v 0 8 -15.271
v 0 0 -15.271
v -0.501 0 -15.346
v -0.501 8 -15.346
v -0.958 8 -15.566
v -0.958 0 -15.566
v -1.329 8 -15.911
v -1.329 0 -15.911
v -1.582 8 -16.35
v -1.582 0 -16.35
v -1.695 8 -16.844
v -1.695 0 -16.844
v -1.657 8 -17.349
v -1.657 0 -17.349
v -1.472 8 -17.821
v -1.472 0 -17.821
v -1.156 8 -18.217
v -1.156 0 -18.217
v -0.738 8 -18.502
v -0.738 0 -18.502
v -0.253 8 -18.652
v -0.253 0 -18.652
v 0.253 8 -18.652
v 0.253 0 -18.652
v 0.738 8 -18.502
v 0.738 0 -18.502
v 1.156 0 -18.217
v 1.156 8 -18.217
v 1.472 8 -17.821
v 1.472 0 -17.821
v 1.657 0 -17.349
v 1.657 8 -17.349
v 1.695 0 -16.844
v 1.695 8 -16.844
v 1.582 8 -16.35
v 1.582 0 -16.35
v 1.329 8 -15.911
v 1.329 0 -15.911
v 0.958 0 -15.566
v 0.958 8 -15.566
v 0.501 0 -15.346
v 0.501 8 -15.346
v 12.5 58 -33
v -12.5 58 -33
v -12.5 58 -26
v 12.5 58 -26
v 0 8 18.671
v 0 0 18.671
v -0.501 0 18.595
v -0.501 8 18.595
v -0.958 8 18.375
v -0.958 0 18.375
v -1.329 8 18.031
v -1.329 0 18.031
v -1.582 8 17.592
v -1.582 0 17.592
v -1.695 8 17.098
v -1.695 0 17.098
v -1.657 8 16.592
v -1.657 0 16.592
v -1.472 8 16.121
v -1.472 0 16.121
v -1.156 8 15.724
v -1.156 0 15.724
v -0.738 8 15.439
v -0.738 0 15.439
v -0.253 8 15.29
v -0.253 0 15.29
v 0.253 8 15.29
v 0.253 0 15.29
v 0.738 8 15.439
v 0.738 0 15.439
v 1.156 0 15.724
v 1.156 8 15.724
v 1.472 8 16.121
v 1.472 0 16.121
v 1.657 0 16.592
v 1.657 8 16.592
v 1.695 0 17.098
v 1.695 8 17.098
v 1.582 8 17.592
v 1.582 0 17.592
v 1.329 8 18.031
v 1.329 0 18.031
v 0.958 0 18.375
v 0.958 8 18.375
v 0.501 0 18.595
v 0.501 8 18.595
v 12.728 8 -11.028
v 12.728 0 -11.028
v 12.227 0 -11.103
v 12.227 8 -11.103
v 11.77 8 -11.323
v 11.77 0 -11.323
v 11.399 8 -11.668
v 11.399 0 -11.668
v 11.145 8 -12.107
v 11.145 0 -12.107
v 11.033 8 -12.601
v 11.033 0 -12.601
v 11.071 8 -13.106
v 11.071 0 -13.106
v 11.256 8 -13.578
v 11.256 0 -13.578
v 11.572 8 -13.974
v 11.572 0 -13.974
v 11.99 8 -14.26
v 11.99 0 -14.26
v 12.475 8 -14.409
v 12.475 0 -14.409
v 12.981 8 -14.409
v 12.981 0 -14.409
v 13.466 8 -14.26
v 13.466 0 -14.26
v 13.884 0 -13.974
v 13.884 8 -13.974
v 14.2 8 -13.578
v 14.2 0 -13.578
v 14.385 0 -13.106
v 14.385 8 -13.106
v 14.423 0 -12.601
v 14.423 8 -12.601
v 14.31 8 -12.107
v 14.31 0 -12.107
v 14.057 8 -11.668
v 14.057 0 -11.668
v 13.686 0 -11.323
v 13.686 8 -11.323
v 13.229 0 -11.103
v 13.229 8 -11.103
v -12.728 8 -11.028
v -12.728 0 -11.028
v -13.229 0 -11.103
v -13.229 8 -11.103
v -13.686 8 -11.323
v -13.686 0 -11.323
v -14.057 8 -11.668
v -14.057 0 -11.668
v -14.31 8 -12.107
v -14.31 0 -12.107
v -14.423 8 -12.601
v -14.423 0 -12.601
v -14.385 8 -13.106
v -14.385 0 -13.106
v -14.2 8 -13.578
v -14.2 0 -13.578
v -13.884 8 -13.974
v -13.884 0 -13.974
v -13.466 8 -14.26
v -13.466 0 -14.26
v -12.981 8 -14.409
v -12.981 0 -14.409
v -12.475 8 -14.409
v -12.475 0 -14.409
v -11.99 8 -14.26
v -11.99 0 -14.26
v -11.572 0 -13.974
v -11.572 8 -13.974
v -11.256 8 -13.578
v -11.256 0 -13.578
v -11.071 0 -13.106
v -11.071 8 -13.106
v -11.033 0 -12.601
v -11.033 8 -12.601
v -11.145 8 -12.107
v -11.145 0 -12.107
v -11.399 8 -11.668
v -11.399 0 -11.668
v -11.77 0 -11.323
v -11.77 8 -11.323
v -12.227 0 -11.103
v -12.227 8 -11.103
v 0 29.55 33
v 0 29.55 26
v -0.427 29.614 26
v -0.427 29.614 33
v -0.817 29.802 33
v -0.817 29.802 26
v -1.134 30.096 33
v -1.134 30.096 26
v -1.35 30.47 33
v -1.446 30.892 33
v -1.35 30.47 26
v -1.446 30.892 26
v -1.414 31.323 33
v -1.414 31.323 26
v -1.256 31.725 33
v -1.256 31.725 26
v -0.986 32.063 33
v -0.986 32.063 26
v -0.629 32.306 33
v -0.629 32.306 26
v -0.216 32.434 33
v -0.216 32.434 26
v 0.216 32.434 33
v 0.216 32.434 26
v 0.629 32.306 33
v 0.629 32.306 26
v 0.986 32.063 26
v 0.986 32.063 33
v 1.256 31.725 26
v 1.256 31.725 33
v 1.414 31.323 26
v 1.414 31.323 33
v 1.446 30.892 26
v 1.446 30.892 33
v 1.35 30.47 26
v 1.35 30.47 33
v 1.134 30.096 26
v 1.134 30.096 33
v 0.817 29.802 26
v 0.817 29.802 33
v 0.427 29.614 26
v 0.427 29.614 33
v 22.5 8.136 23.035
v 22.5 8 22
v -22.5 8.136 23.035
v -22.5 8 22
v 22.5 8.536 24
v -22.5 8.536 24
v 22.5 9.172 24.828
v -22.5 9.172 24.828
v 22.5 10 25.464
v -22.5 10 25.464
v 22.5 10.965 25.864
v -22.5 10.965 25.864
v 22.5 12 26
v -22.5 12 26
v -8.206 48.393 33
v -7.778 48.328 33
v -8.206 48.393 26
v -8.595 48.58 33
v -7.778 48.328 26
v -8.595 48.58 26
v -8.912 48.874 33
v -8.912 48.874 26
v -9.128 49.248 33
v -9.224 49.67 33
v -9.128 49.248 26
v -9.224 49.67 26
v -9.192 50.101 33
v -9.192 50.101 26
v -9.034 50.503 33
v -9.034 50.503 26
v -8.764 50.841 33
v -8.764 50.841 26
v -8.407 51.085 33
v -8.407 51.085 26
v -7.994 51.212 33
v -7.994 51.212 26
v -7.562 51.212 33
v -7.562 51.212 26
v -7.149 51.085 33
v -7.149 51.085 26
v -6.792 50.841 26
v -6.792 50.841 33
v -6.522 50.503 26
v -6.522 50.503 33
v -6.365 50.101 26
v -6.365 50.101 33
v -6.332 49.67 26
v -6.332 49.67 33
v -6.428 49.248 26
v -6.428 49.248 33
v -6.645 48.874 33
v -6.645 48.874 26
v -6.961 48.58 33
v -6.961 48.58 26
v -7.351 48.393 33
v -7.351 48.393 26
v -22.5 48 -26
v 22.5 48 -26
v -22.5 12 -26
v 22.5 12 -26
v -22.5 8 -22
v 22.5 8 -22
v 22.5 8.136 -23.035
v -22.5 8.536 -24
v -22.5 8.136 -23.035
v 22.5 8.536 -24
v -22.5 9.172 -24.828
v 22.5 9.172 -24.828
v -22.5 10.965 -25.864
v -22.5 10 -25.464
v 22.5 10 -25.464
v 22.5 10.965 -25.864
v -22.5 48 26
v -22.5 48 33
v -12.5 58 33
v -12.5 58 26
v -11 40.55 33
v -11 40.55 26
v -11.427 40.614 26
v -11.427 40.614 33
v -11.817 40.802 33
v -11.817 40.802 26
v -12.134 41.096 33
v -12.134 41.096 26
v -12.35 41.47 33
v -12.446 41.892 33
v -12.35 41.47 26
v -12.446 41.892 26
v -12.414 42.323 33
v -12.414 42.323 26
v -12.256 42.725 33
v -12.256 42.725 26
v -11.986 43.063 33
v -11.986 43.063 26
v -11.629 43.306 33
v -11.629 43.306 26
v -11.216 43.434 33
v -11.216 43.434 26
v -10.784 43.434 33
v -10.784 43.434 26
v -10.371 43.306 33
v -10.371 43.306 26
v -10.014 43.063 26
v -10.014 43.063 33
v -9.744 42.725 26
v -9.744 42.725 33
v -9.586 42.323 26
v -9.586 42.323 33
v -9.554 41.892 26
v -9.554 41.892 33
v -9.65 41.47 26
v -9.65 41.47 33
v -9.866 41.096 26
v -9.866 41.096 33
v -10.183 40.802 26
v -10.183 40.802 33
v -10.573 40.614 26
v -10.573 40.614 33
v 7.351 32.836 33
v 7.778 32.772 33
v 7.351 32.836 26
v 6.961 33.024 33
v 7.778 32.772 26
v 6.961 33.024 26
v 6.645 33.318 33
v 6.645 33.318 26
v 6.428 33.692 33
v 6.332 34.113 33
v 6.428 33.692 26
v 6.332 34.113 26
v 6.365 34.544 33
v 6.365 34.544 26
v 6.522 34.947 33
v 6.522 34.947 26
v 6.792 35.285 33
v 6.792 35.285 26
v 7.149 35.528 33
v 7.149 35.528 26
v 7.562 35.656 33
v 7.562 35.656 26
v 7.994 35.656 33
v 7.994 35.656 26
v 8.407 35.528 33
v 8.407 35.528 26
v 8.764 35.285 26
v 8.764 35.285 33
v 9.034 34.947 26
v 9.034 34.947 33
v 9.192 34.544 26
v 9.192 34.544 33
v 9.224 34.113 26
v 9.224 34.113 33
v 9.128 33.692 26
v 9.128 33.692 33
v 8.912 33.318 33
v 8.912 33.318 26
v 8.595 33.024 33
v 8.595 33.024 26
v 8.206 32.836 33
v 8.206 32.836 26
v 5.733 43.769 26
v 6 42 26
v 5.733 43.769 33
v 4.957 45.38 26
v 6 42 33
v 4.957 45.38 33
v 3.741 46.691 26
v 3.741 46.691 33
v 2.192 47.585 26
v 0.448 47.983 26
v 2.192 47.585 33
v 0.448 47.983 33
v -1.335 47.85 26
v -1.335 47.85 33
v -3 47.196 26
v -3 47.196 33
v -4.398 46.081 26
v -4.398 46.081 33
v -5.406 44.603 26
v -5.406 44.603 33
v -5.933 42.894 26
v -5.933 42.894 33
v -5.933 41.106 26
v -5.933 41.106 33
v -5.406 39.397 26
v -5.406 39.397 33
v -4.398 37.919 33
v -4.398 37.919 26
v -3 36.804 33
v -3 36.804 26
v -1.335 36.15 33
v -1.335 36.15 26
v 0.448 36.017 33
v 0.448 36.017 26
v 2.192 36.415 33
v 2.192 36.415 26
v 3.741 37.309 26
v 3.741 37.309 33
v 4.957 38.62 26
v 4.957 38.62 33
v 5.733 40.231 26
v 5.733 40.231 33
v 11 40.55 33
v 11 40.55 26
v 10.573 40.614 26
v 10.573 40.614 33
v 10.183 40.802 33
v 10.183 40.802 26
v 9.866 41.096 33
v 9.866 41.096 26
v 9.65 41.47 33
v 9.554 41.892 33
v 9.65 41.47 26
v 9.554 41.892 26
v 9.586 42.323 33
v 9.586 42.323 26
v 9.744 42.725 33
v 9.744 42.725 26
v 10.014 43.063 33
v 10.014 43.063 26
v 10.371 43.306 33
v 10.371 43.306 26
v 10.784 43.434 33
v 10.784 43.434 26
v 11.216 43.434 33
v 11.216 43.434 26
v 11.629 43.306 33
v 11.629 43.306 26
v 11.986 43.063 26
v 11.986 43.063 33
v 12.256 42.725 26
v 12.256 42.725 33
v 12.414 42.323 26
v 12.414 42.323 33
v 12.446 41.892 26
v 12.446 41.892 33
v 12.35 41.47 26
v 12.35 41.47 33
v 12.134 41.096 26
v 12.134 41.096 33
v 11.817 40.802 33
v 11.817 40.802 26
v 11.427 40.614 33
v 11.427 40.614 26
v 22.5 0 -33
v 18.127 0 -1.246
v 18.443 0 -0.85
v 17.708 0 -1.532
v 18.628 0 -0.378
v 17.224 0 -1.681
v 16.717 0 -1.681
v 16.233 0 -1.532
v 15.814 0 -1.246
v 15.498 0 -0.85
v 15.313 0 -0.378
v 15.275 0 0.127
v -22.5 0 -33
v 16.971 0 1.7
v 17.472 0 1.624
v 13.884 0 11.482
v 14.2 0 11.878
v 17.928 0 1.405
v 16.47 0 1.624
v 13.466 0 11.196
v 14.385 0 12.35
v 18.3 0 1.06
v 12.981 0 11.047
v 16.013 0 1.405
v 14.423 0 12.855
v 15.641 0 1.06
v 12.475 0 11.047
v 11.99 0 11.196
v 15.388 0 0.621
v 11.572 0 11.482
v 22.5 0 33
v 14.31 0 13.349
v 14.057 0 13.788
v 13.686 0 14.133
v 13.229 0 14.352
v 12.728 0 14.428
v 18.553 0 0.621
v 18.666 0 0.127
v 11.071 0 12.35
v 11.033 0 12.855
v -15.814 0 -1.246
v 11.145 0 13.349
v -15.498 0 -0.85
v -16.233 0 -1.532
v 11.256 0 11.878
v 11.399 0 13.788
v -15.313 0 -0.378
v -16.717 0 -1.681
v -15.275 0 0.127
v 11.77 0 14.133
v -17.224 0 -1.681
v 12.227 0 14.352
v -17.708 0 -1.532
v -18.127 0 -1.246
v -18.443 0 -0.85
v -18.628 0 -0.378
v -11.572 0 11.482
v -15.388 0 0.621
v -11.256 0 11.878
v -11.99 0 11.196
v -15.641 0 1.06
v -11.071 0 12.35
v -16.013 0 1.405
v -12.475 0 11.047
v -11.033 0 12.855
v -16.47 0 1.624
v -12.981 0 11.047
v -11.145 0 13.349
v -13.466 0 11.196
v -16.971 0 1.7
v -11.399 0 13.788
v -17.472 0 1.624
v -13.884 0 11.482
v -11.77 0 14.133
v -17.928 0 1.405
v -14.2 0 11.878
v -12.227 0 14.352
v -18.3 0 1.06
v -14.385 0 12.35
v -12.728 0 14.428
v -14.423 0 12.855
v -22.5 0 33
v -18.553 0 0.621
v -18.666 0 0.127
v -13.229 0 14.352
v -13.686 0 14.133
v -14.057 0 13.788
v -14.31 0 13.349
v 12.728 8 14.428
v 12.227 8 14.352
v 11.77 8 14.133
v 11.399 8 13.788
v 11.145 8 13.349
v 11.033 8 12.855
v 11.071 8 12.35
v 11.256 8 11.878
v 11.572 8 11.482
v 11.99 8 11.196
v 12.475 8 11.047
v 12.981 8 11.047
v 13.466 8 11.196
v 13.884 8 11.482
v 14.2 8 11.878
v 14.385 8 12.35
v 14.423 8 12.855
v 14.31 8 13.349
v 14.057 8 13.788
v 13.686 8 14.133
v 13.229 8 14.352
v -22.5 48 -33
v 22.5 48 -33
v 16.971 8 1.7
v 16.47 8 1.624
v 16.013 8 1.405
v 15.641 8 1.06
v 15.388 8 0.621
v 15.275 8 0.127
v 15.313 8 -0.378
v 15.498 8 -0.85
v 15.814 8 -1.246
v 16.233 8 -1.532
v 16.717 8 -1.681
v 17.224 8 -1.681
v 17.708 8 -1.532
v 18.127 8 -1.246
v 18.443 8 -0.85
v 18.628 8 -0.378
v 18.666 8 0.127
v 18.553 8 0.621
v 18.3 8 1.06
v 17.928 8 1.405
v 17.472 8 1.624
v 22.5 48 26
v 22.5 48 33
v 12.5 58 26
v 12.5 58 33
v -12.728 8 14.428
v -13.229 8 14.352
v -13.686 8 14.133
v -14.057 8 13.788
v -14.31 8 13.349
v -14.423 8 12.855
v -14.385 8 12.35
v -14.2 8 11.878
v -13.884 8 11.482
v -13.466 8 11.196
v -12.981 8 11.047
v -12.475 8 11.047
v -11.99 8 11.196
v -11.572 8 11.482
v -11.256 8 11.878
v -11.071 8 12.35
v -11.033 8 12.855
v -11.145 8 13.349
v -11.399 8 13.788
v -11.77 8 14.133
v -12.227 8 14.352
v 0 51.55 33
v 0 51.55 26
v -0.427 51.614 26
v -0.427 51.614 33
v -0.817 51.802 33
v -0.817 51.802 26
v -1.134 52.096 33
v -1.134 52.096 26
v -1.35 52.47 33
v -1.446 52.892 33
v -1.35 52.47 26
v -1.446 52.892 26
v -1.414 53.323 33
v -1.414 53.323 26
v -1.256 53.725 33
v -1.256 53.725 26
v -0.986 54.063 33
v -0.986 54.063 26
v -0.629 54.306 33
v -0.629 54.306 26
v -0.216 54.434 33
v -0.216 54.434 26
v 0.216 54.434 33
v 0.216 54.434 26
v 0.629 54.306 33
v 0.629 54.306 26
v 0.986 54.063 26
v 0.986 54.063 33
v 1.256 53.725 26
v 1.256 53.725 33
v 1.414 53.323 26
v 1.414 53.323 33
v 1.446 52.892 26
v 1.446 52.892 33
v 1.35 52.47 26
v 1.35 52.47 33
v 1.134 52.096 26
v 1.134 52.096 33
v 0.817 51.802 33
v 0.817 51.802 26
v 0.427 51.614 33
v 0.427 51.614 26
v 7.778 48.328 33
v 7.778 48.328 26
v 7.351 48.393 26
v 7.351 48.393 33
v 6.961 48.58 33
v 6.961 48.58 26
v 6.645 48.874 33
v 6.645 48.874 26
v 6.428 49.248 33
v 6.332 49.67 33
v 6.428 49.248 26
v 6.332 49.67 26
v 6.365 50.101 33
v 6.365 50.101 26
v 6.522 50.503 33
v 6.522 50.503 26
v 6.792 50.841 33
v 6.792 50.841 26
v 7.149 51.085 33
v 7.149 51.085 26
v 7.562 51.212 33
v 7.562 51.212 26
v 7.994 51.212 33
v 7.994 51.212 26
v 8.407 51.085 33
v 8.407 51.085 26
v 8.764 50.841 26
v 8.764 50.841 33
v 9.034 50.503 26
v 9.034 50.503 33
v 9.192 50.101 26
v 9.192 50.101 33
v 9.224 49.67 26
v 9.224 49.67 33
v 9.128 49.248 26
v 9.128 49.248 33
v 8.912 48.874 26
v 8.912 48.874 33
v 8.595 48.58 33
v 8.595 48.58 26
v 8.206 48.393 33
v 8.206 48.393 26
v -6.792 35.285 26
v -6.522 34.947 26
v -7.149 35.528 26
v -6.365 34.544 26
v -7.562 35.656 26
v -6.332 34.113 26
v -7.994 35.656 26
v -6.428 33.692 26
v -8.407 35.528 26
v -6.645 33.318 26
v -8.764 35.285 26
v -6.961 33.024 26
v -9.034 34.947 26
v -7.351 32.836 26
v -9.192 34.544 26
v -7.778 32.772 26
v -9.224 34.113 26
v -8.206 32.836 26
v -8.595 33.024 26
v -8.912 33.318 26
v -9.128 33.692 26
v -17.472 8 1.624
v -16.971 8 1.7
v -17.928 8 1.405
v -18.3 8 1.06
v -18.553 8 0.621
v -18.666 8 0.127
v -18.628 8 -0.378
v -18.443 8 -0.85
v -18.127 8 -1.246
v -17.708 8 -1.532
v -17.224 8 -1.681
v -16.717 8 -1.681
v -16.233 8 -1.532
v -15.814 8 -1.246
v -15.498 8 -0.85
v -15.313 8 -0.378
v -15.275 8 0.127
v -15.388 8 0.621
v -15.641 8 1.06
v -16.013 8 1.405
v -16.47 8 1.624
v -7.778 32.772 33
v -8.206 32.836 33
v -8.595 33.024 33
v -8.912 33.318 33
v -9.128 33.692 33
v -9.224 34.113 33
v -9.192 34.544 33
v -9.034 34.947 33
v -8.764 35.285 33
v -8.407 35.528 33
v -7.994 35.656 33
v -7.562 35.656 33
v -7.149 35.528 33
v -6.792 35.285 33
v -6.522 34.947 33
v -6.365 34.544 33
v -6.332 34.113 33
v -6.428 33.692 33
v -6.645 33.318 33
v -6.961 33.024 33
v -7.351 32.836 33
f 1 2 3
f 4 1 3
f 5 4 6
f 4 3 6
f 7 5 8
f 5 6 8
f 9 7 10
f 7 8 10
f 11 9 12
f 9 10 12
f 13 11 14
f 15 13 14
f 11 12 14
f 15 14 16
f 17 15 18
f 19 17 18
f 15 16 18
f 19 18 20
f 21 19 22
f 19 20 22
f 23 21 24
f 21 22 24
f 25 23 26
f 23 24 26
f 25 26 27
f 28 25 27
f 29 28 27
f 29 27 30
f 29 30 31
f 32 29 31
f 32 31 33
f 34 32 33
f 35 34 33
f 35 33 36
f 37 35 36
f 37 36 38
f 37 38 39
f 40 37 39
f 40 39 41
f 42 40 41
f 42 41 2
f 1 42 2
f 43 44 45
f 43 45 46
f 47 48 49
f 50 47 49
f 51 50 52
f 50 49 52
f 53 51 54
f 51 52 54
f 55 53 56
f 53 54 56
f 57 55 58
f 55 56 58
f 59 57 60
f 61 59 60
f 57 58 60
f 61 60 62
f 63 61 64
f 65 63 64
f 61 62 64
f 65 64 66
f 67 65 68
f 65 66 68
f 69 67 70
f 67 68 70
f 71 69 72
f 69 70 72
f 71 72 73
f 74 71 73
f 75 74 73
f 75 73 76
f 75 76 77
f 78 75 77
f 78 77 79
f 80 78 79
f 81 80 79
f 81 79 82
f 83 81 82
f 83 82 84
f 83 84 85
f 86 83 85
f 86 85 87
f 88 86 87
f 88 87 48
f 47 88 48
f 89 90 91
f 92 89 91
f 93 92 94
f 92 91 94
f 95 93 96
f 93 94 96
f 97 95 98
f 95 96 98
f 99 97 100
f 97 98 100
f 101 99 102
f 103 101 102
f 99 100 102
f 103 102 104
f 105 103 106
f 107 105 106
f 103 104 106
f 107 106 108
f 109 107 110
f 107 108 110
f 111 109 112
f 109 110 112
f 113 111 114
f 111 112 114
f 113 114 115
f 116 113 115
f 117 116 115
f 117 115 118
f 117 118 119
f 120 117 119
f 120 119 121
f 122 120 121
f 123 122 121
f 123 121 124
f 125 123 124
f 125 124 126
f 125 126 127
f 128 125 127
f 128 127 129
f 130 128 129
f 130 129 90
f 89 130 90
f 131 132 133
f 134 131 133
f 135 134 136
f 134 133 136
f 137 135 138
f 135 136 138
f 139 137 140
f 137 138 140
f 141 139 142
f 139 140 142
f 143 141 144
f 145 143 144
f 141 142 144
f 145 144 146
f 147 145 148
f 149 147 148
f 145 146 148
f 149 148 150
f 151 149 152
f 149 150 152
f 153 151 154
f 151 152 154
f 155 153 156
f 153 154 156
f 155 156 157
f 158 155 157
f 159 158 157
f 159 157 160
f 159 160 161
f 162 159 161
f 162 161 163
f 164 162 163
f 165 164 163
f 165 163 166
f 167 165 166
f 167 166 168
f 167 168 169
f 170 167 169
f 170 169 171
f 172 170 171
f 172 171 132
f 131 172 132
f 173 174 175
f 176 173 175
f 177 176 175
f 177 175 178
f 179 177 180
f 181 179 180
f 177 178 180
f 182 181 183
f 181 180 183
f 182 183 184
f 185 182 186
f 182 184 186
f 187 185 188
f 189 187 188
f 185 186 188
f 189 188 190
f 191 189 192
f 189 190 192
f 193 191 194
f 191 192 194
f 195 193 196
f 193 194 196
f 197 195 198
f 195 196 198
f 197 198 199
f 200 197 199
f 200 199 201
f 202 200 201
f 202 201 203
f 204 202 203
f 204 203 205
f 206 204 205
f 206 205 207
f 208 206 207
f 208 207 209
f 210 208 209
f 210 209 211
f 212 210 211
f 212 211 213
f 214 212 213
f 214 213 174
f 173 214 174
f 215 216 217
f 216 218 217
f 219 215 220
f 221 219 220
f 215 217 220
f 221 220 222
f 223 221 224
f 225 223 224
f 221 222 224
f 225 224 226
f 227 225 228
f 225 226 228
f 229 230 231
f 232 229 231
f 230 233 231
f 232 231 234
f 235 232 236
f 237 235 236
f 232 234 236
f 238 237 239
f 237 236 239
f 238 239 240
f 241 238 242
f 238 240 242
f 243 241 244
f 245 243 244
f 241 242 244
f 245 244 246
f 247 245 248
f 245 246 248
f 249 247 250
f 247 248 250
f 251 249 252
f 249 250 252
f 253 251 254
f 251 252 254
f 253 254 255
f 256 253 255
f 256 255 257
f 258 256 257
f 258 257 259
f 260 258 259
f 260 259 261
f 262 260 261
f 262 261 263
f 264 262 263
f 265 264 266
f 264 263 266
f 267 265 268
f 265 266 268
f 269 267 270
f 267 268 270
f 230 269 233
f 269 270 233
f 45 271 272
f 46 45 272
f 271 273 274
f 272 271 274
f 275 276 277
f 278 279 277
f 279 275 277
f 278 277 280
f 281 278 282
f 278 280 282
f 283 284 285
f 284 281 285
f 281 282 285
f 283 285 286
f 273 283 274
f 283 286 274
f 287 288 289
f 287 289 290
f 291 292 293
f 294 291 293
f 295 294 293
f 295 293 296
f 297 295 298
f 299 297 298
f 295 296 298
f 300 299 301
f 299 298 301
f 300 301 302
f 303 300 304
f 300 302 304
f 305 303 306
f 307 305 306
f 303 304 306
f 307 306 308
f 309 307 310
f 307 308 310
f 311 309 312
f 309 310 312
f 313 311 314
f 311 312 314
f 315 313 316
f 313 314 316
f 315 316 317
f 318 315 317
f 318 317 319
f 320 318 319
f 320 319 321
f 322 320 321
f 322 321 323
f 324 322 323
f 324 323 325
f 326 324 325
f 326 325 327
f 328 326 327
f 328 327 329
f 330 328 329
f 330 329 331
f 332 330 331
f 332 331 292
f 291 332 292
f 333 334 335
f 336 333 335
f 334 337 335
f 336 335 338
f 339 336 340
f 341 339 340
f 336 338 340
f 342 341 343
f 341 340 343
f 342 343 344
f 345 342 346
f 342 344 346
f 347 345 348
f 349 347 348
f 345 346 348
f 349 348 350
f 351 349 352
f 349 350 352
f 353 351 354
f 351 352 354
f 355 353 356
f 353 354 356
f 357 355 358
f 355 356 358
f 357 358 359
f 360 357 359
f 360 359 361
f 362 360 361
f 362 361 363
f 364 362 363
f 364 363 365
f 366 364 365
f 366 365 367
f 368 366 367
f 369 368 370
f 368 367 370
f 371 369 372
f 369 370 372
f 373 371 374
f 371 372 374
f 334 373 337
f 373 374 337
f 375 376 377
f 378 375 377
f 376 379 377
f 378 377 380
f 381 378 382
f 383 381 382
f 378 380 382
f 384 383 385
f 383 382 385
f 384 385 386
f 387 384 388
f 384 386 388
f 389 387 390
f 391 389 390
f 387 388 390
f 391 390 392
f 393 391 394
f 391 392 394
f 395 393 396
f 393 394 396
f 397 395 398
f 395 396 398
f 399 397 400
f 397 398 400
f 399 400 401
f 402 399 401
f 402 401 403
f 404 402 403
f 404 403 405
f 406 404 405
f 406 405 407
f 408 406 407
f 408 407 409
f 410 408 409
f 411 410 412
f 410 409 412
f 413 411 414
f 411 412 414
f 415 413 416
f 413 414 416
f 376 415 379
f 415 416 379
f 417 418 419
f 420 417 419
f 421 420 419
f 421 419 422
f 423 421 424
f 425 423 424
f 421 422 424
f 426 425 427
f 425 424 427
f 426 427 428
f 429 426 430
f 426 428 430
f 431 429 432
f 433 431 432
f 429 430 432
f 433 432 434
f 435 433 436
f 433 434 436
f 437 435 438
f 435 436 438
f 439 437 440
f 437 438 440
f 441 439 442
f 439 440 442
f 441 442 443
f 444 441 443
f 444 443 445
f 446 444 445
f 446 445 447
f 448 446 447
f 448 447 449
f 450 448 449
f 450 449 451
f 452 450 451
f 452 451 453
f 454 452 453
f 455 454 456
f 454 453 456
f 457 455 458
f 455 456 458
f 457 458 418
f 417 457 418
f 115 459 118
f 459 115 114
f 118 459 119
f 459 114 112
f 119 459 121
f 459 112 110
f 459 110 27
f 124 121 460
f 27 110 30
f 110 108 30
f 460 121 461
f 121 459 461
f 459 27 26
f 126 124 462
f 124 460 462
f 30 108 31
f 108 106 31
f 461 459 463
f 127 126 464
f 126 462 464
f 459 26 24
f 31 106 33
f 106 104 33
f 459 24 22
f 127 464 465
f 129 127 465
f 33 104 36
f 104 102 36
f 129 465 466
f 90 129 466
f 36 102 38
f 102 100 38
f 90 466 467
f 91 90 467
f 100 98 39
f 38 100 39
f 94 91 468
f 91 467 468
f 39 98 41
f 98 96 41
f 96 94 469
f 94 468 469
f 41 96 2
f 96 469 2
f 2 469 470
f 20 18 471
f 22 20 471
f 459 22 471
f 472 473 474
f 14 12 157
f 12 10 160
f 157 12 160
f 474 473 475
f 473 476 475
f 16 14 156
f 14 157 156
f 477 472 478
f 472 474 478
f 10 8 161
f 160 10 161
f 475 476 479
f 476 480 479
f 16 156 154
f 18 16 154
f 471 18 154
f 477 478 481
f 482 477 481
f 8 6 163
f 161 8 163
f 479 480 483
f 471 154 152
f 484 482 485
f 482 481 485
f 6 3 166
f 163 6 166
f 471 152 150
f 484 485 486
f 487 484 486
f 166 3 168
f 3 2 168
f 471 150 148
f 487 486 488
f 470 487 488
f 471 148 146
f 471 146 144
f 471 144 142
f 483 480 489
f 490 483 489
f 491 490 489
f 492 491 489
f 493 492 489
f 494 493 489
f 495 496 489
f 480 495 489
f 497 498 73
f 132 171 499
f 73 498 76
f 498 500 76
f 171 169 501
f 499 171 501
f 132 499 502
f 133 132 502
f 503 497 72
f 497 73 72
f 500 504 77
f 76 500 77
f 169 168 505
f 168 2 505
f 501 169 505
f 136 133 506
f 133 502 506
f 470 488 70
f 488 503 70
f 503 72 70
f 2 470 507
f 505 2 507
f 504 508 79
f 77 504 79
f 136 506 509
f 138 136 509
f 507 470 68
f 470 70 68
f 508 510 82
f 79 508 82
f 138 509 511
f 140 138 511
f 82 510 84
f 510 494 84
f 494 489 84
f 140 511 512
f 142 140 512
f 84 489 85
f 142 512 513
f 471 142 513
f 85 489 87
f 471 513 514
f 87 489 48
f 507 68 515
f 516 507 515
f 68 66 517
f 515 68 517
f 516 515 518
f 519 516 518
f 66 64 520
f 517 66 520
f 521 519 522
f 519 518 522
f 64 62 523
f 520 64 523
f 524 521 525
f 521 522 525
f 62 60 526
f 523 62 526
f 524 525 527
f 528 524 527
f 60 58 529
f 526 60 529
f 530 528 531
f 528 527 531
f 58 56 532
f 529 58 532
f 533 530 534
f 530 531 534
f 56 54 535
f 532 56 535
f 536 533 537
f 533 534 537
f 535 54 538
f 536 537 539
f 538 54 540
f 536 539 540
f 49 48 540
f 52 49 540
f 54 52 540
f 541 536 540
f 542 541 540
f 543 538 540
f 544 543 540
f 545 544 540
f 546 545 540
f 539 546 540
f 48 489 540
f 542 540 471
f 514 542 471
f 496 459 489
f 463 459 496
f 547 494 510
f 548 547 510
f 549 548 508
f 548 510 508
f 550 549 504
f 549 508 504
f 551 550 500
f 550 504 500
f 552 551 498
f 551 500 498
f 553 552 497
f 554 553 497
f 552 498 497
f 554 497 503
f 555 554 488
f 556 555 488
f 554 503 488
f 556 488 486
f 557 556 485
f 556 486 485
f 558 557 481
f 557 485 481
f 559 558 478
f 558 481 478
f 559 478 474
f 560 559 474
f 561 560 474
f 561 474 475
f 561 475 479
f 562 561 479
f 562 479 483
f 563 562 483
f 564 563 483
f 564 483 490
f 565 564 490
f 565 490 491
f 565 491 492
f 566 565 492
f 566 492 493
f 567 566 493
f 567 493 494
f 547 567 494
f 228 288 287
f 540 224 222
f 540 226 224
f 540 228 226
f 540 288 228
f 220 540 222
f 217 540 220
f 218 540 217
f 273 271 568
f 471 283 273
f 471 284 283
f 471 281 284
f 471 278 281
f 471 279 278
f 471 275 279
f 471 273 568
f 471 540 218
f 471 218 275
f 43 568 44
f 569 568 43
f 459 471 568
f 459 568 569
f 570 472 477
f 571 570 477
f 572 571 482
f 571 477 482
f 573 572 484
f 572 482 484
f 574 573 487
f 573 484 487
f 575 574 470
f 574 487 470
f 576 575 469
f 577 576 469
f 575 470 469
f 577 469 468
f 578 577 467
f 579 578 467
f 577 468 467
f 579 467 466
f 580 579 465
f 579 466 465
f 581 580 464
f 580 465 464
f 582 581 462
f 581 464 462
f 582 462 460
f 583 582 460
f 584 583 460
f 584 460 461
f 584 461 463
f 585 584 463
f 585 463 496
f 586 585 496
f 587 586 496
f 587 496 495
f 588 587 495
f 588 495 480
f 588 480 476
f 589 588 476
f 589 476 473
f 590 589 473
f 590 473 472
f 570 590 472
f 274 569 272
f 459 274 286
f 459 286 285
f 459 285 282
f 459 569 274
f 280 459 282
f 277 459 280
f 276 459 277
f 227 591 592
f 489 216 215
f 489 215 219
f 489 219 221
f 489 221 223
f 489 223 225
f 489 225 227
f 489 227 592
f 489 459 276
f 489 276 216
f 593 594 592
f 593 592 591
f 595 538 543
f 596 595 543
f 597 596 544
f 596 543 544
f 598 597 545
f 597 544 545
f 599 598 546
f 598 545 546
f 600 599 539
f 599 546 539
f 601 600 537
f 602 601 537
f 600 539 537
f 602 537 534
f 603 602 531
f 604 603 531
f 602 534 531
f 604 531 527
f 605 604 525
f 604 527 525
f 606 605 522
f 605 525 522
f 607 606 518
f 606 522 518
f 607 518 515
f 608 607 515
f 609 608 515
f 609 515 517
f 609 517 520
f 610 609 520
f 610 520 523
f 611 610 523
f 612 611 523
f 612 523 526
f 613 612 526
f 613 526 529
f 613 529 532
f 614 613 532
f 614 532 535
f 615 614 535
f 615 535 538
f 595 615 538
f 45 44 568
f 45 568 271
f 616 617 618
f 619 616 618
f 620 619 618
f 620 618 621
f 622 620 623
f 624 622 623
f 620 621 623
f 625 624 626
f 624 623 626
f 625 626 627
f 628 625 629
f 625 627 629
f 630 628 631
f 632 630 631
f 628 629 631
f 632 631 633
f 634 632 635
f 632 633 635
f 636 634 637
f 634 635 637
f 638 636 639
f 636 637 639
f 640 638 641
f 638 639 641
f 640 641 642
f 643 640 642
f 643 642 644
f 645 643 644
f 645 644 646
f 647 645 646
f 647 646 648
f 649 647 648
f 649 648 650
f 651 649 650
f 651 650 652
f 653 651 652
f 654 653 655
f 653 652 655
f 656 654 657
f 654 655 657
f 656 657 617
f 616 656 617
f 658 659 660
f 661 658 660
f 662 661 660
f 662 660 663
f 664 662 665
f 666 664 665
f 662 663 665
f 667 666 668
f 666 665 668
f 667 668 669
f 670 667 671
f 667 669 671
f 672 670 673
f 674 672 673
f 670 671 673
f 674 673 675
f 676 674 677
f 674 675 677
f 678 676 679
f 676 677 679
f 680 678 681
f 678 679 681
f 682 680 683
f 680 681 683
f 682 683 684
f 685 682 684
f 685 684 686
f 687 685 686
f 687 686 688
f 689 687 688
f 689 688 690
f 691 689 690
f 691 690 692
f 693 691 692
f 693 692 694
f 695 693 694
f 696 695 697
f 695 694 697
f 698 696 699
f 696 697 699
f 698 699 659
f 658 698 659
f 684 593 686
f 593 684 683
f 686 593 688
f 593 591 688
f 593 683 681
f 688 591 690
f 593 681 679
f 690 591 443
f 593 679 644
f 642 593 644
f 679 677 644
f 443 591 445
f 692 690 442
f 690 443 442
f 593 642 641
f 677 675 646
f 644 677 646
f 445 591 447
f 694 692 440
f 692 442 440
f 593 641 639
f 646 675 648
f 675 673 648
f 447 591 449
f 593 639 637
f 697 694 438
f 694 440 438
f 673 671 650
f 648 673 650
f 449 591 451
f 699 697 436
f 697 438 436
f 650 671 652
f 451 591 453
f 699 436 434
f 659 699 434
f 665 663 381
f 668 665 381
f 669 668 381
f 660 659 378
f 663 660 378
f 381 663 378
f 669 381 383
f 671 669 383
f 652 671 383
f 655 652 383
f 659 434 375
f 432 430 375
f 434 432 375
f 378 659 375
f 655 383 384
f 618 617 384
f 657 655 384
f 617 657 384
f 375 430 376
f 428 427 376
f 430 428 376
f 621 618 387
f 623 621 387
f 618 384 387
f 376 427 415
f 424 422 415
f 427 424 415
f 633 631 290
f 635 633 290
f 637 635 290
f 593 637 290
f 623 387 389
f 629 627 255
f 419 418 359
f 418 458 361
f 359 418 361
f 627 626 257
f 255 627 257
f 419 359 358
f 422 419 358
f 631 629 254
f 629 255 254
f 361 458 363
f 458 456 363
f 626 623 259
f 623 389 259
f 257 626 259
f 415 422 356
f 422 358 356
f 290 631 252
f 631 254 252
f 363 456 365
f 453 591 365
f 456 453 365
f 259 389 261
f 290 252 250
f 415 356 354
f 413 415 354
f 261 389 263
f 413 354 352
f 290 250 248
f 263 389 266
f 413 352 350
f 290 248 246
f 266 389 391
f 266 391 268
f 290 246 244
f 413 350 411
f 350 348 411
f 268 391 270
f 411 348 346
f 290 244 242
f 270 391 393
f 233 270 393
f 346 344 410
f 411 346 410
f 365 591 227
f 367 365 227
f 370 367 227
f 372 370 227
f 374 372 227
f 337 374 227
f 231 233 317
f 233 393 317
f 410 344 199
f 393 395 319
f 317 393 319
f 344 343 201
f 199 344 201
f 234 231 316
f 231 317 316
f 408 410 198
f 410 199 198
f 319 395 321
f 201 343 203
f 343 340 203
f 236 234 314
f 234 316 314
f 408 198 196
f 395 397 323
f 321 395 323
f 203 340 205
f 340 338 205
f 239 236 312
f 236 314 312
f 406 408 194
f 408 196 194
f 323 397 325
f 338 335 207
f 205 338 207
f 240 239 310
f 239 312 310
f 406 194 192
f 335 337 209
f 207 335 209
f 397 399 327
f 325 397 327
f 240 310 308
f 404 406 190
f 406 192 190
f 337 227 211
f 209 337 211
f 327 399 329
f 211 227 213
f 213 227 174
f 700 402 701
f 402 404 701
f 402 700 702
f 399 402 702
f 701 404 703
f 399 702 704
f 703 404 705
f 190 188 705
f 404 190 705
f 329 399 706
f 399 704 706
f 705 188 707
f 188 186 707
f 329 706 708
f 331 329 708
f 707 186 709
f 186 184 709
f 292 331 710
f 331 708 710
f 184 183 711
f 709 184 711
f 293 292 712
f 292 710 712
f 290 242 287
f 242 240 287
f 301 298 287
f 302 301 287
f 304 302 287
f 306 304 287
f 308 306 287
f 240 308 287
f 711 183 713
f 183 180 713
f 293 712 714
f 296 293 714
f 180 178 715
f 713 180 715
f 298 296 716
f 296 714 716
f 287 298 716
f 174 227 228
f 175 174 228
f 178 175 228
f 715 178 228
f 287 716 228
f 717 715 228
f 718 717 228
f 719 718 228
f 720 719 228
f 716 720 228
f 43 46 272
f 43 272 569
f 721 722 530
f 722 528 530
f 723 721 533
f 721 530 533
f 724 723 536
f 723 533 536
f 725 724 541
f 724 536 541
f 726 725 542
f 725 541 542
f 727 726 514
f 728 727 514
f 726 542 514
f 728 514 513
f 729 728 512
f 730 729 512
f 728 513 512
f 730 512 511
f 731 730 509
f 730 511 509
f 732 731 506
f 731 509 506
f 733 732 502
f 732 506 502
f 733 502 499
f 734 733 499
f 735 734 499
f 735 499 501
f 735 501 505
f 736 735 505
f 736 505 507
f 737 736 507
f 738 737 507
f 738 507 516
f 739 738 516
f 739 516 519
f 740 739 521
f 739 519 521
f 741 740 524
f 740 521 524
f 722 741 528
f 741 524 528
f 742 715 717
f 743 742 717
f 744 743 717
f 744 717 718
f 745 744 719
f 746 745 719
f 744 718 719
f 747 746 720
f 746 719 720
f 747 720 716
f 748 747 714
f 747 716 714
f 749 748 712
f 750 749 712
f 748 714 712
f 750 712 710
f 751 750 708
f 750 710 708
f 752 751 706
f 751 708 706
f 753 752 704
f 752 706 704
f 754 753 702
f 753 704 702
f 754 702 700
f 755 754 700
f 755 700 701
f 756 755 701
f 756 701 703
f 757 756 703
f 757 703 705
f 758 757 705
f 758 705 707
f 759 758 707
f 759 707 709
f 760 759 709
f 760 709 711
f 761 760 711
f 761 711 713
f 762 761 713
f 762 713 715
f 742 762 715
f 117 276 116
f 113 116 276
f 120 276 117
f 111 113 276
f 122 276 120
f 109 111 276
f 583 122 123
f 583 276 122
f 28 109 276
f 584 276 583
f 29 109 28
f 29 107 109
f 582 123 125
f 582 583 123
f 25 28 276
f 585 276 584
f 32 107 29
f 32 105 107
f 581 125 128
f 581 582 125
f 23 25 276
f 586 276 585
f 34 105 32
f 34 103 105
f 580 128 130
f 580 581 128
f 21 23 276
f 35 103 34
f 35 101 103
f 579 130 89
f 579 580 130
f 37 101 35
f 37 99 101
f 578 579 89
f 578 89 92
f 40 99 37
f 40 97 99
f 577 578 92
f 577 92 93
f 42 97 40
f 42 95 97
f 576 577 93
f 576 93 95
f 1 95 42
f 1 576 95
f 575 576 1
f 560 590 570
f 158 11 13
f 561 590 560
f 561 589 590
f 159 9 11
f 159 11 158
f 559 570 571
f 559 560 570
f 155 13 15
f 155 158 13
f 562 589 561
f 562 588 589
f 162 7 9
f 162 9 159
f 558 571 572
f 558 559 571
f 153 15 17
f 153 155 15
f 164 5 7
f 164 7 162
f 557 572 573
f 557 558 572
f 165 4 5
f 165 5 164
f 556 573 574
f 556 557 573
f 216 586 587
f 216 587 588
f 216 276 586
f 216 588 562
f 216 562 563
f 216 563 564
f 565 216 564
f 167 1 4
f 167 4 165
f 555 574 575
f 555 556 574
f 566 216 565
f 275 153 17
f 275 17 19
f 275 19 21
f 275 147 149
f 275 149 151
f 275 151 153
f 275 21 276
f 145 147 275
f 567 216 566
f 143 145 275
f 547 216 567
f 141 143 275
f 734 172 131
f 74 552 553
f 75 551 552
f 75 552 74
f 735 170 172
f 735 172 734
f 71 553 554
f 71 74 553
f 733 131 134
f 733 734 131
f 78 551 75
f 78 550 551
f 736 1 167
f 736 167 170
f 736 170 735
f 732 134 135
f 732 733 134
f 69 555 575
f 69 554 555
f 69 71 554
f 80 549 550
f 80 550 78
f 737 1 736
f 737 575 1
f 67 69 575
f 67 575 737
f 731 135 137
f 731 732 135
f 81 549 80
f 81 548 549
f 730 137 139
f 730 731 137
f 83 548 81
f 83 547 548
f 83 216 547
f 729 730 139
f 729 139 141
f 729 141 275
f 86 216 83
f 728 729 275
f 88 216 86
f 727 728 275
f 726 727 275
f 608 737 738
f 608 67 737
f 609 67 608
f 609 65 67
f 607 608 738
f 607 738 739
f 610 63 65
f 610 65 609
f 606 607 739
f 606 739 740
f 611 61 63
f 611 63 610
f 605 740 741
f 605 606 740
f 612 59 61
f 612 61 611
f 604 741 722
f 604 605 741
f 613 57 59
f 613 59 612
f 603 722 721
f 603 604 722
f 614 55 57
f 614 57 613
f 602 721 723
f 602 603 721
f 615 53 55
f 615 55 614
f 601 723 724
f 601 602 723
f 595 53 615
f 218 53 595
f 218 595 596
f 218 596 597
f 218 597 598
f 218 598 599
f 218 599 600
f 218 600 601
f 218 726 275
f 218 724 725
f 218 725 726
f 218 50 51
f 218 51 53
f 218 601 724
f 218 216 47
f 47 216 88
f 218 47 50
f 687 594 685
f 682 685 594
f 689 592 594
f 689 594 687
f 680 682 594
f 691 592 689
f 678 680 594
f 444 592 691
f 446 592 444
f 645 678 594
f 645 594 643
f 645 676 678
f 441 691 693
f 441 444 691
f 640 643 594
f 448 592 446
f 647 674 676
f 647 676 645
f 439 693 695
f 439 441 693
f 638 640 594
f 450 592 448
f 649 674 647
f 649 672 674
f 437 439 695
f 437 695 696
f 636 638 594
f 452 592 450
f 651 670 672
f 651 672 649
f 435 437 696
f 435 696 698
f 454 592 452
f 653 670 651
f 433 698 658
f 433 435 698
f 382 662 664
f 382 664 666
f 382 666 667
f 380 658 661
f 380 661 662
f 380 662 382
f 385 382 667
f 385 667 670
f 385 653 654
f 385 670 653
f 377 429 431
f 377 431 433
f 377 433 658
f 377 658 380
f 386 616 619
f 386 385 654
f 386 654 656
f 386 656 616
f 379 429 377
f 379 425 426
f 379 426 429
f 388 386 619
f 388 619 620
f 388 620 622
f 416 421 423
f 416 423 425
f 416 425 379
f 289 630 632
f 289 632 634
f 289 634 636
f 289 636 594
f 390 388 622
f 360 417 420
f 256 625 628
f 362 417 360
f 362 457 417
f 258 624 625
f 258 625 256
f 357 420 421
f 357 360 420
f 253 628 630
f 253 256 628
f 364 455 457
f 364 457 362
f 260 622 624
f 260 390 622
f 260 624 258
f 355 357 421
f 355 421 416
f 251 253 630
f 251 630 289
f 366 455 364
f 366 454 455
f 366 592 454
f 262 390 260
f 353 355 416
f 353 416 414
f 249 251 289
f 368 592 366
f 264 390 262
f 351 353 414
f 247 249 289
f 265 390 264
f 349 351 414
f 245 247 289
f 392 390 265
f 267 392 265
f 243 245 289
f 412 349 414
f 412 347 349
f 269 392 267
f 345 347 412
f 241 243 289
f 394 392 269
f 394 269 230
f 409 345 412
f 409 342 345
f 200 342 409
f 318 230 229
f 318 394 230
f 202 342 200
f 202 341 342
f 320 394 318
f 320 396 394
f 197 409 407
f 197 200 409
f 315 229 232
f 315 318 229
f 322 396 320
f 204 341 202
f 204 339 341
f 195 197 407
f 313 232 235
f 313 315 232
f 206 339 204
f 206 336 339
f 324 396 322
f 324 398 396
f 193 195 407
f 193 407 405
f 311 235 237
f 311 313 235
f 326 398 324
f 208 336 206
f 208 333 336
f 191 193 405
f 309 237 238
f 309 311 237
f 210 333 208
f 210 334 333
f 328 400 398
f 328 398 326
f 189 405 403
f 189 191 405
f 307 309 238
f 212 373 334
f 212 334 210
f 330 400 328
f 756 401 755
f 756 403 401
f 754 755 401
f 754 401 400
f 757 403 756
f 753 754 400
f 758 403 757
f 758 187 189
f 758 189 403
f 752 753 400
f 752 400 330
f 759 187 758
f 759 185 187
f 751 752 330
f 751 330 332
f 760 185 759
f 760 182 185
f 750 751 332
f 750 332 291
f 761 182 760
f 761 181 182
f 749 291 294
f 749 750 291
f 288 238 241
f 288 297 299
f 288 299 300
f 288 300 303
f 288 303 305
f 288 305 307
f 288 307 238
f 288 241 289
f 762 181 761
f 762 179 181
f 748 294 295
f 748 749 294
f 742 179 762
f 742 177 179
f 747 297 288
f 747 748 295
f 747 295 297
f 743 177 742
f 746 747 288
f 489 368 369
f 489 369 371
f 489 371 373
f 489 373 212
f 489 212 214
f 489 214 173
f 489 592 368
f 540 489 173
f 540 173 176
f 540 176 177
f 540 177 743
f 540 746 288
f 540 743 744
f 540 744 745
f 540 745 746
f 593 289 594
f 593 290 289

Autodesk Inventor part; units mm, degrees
ref_plane "YZ Plane" through (0, 0, 0) normal (1, 0, 0) x (0, 1, 0)
ref_plane "XZ Plane" through (0, 0, 0) normal (0, 1, 0) x (-1, 0, 0)
ref_plane "XY Plane" through (0, 0, 0) normal (0, 0, 1) x (1, 0, 0)
sketch "Skizze1" plane through (0, 0, 0) normal (0, 1, 0) x (-1, 0, 0)
  line L0 (-22.5, 33) -> (22.5, 33)
  line L1 (22.5, 33) -> (22.5, -33)
  line L2 (22.5, -33) -> (-22.5, -33)
  line L3 (-22.5, -33) -> (-22.5, 33)
  line L4 (-22.5, 33) -> (22.5, -33) construction
  line L5 (22.5, 33) -> (-22.5, -33) construction
  point P0 (0, 0)
  dimension "d0" = 45
  dimension "d1" = 66
extrude "Extrusion1" add sketch "Skizze1" along normal blind 8
sketch "Skizze2" plane through (0, 8, 0) normal (0, 1, 0) x (1, 0, 0)
  line L0 (-22.5, -33) -> (22.5, -33) projected
  line L1 (22.5, -33) -> (22.5, 33) projected
  line L2 (22.5, 33) -> (-22.5, 33) projected
  line L3 (-22.5, 33) -> (-22.5, -33) projected
  line L4 (-22.5, -33) -> (22.5, -33)
  line L5 (22.5, -33) -> (22.5, -26)
  line L6 (22.5, -26) -> (-22.5, -26)
  line L7 (-22.5, -26) -> (-22.5, -33)
  line L8 (22.5, 33) -> (-22.5, 33)
  line L9 (-22.5, 33) -> (-22.5, 26)
  line L10 (-22.5, 26) -> (22.5, 26)
  line L11 (22.5, 26) -> (22.5, 33)
  point P0 (0, 0)
  dimension "d4" = 7
  dimension "d5" = 7
extrude "Extrusion2" add sketch "Skizze2" along normal blind 50 contours L3 L6 L1 L0 | L3 L2 L1 L10
sketch "Skizze3" plane through (0, 8, 0) normal (0, 1, 0) x (1, 0, 0)
  line L0 (-22.5, -26) -> (22.5, -26) construction
  line L1 (22.5, -26) -> (22.5, 26) construction
  line L2 (22.5, 26) -> (-22.5, 26) construction
  line L3 (-22.5, 26) -> (-22.5, -26) construction
  line L4 (-22.5, -26) -> (22.5, 26) construction
  line L5 (-22.5, 26) -> (22.5, 26) construction
  line L6 (22.5, -26) -> (-22.5, 26) construction
  line L7 (16.9706, 0) -> (0, 16.9706) construction
  line L8 (0, 16.9706) -> (-16.9706, 0) construction
  line L9 (-16.9706, 0) -> (0, -16.9706) construction
  line L10 (0, -16.9706) -> (16.9706, 0) construction
  line L11 (16.9706, 0) -> (-16.9706, 0) construction
  line L12 (0, 16.9706) -> (0, -16.9706) construction
  circle A0 centre (0, 0) radius 18 construction
  line L13 (17.4913, 17.4913) -> (-17.5019, -17.5019) construction
  line L14 (16.4193, -16.4193) -> (-16.3603, 16.3603) construction
  point P0 (0, 0)
  point P1 (0, 0)
  point P2 (-12.7279, -12.7279)
  point P3 (12.7279, -12.7279)
  point P4 (12.7279, 12.7279)
  point P5 (-12.7279, 12.7279)
  dimension "d12" = 24
  dimension "d13" = 24
  dimension "d14" = 36
hole "Bohrung1" at (-16.9706, 8, 0) at (0, 8, -16.9706) at (16.9706, 8, 0) at (0, 8, 16.9706) at (-12.7279, 8, 12.7279) at (-12.7279, 8, -12.7279) at (12.7279, 8, -12.7279) at (12.7279, 8, 12.7279) direction (0, -1, 0) diameter 3.4 end through all clearance for "Inbusschraube ISO 4762" size "M3" standard "ISO"
sketch "Skizze4" plane through (-22.5, 0, 33) normal (0, 0, 1) x (1, 0, 0)
  line L0 (22.5, 0) -> (22.5, 74.8441) construction
  line L1 (0, 58) -> (45, 58) projected
  circle A0 centre (22.5, 42) radius 6
  line L2 (45, 0) -> (45, 52) projected
  line L3 (0, 52) -> (45, 52) projected
  line L4 (0, 0) -> (0, 52) projected
  point P0 (22.5, 53)
  dimension "d22" = 5
  dimension "d23" = 11
  dimension "d34" = 12
hole "Bohrung2" at (0, 53, 33) direction (0, 0, -1) diameter 2.9 end up to surface clearance for "Inbusschraube ISO 4762" size "M2.5" standard "ISO"
pattern_circular "Runde Anordnung1" count 8 over 360 about axis through (0, 42, 33) along (0, 0, 1) of "Bohrung2"
extrude "Extrusion3" cut sketch "Skizze4" against normal up to surface (7 mm away)
chamfer "Fase1" distance 10 angle 45 4 edges at (-22.5, 58, 29.5) (-22.5, 58, -29.5) (22.5, 58, 29.5) (22.5, 58, -29.5)
fillet "Rundung1" radius 4 2 edges at (0, 8, 26) (0, 8, -26)
equation "\"d4\" = d5"
properties part number "frame_mx108" material "Aluminium 6061"
